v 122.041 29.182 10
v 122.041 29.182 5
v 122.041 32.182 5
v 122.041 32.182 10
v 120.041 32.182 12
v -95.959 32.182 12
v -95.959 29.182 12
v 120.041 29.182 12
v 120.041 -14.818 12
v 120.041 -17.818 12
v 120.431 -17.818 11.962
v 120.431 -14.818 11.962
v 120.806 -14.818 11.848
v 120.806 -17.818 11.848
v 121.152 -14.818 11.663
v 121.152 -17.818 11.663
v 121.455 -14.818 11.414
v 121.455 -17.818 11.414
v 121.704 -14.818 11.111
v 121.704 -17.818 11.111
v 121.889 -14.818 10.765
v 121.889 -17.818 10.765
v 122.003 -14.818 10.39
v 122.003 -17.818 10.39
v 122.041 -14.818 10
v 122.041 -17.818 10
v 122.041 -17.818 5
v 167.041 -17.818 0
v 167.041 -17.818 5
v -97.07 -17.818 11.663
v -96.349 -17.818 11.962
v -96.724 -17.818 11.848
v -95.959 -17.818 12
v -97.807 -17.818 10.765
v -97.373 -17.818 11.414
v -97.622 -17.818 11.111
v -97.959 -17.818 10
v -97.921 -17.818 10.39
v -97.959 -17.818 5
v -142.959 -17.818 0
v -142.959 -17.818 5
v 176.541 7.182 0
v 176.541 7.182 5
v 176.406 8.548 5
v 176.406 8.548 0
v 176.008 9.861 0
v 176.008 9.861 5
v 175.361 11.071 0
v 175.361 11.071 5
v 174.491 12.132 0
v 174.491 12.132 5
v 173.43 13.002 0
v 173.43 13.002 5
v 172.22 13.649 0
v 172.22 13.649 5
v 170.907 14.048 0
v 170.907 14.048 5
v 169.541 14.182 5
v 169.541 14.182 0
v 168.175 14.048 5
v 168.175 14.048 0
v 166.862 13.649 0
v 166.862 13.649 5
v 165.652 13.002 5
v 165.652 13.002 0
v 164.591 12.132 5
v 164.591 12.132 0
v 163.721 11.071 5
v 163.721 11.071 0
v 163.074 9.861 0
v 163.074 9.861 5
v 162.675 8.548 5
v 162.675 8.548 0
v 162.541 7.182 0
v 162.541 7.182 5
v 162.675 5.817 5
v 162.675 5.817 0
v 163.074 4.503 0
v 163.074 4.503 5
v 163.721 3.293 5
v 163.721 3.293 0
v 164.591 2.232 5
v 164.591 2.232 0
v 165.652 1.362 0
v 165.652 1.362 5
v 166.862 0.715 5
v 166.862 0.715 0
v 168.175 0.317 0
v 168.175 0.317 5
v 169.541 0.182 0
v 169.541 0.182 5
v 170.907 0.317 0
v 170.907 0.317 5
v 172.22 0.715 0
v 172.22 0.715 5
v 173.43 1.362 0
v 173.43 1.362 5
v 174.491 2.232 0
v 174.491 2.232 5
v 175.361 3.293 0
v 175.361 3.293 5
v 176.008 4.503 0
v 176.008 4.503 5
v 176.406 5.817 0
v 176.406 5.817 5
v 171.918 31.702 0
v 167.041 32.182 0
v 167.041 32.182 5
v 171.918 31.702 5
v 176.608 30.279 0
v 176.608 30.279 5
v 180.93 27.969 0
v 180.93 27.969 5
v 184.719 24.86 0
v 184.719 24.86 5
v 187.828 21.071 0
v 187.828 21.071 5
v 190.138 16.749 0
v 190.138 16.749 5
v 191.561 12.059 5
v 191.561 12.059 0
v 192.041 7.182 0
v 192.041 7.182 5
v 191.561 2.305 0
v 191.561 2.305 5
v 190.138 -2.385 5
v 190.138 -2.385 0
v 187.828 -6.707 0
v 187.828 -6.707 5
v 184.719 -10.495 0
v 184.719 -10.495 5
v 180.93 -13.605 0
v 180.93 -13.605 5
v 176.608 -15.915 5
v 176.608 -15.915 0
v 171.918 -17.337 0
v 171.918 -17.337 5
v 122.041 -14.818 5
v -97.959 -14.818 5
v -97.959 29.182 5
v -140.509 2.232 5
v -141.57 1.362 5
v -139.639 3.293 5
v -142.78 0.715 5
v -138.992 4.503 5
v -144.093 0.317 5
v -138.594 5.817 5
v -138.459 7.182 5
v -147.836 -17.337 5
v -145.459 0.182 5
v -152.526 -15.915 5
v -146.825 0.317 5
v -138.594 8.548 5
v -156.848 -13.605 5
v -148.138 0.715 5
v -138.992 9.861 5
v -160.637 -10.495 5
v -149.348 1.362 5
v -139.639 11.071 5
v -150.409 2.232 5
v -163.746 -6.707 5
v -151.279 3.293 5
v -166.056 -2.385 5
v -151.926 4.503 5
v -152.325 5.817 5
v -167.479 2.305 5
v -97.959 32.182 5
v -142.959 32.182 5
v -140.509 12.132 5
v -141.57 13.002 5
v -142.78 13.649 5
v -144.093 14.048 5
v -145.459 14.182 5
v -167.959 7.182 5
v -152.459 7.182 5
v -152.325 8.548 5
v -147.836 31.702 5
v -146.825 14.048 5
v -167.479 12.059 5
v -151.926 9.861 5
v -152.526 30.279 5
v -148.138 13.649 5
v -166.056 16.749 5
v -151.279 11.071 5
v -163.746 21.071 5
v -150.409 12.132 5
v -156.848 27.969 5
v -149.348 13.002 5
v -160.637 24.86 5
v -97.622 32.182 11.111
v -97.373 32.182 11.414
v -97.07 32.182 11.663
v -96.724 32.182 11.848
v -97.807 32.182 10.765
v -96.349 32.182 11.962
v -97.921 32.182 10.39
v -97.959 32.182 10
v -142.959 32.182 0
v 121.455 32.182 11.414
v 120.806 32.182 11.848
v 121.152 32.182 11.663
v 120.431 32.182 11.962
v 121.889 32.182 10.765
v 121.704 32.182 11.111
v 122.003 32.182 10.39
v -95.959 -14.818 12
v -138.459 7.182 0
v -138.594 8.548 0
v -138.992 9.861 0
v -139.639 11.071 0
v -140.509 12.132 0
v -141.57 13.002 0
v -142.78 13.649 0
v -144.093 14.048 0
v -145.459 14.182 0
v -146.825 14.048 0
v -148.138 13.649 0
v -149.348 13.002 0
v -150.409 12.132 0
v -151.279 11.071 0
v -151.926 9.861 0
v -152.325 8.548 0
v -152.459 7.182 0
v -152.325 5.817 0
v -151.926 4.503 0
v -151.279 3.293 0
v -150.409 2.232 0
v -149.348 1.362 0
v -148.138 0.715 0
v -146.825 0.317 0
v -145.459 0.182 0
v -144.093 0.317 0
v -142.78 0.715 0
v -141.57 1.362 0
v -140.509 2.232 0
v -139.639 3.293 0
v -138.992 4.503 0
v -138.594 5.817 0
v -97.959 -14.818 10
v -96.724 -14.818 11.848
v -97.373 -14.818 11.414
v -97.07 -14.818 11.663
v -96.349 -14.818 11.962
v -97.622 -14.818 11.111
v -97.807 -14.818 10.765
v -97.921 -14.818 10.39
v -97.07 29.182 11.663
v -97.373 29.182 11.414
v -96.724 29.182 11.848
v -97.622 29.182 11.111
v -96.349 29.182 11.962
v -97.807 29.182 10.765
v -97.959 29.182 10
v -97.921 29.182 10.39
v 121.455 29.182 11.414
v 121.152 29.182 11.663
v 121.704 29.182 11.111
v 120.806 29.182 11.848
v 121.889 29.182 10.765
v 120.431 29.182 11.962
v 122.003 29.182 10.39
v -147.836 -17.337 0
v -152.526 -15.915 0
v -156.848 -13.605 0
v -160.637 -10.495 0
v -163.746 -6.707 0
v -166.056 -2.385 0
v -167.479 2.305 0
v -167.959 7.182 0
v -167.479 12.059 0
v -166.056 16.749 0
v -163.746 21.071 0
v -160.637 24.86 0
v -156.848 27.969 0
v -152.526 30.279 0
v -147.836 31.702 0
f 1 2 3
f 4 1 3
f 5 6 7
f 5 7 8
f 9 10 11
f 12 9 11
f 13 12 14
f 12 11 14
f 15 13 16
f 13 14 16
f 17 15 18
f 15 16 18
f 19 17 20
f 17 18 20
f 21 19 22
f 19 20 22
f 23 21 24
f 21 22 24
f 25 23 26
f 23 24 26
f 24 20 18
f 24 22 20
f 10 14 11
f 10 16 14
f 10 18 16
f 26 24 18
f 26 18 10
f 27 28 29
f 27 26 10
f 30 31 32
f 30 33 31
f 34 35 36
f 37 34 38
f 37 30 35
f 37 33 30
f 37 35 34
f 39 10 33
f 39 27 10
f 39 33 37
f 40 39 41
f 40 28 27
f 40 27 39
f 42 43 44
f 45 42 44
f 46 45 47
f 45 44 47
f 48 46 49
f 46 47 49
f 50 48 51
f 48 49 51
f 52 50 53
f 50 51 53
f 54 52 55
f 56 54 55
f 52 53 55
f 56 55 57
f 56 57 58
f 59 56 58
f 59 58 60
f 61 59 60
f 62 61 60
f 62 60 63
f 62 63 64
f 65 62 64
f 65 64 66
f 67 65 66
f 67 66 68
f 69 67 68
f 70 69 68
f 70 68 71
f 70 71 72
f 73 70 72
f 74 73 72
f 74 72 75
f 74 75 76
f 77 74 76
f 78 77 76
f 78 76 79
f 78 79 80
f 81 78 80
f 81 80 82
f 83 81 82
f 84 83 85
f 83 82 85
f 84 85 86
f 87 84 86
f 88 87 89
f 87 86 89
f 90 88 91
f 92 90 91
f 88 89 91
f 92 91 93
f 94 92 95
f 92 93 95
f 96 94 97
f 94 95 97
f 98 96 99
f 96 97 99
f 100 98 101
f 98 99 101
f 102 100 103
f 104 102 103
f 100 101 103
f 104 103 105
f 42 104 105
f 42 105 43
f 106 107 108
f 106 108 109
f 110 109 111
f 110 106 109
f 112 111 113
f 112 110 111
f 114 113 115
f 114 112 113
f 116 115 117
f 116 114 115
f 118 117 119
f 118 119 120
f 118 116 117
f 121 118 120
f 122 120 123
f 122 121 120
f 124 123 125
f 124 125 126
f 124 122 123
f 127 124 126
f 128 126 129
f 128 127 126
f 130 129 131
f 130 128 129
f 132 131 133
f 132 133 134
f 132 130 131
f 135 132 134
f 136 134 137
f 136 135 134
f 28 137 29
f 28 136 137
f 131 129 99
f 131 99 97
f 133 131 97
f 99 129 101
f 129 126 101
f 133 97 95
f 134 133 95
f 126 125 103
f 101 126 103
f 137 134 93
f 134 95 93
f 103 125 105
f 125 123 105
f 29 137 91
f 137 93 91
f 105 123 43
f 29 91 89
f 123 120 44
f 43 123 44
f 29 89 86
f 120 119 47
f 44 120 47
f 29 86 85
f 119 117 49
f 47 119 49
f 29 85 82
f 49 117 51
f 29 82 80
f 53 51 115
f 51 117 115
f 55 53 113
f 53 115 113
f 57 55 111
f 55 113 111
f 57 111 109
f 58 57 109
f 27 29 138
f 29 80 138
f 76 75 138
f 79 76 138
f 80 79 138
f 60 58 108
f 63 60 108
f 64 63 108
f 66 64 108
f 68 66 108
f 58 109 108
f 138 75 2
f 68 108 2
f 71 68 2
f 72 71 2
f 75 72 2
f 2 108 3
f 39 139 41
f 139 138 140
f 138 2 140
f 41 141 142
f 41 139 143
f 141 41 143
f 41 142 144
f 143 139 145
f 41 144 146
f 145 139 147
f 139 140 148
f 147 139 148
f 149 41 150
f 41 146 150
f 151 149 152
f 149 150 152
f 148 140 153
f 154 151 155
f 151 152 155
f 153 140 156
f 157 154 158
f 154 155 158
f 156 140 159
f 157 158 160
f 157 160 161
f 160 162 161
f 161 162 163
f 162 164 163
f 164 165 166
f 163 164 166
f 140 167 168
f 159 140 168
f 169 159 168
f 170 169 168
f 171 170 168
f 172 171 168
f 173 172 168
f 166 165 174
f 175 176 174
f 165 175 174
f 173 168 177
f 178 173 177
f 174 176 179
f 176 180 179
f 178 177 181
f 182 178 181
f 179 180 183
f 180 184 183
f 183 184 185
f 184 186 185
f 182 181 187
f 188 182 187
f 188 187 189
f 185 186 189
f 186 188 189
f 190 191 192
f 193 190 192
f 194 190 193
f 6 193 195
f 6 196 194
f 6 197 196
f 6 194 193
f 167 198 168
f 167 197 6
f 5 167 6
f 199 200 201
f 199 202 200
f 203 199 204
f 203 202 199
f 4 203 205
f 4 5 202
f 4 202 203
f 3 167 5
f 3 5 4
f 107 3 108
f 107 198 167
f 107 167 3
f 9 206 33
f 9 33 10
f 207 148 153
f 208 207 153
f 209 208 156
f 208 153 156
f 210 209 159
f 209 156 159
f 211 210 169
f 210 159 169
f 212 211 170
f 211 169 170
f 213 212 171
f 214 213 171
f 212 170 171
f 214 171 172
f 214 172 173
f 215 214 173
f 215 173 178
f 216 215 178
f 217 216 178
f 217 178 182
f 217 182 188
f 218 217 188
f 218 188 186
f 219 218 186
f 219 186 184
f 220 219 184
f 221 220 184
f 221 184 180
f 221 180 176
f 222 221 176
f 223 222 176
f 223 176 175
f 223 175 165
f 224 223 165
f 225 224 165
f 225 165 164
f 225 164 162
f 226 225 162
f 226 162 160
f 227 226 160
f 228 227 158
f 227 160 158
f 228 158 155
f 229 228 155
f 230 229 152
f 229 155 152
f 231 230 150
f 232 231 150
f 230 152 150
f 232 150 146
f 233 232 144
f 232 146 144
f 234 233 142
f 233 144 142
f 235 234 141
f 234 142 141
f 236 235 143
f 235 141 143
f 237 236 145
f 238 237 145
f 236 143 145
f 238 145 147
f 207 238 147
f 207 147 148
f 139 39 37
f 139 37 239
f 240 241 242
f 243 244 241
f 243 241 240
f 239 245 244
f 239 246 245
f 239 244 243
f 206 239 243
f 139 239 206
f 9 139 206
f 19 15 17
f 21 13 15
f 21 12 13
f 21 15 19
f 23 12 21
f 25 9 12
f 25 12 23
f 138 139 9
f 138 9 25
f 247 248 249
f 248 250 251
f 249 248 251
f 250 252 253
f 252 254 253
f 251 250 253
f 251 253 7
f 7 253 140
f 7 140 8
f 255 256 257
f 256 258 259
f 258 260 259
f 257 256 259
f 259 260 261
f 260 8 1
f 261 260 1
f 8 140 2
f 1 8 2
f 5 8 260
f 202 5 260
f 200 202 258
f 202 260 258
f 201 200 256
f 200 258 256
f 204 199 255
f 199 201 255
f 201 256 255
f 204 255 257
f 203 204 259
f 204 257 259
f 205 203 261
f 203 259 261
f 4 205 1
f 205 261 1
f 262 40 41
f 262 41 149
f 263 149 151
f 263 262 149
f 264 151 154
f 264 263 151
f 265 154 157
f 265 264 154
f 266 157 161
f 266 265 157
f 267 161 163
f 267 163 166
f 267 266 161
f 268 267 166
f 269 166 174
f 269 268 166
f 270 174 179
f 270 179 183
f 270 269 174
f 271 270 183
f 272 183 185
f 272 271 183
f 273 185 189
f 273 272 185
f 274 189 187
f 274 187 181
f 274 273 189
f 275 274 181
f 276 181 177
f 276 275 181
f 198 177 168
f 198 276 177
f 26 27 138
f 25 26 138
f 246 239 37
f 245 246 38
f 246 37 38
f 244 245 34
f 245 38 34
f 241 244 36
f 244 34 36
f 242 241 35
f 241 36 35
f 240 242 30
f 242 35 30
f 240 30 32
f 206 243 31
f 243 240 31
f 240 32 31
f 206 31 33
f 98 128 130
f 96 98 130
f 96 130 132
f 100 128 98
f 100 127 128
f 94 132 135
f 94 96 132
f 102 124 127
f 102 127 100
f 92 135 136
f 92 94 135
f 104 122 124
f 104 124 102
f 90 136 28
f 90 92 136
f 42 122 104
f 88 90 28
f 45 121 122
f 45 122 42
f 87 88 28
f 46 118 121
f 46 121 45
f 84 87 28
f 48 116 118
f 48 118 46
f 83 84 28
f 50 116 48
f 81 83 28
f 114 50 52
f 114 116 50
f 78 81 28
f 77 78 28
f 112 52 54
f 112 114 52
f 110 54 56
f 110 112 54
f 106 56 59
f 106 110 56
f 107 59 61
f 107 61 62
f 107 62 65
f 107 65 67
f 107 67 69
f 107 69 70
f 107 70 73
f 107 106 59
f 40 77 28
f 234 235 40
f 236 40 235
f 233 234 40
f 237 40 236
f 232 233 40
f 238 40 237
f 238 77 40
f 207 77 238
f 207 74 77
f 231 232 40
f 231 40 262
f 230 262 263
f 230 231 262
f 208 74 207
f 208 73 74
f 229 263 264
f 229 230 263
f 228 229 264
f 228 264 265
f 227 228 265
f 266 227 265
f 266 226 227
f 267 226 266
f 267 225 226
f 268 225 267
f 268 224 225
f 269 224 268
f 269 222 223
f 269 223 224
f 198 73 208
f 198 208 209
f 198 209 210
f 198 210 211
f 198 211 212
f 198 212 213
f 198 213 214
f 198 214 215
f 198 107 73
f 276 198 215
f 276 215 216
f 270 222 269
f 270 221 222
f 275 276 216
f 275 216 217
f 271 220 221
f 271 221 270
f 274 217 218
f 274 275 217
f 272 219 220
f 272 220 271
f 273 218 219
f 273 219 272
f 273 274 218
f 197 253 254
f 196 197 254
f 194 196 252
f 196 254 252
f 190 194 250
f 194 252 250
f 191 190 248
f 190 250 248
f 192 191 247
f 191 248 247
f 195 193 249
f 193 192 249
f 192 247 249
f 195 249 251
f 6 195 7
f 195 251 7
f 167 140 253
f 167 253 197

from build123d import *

# Parameters (mm, degrees)
BOSS_EXTRUDE1_DEPTH = 5
SKETCH3_W           = 220
SKETCH3_H           = 3
BOSS_EXTRUDE2_DEPTH = 7
SKETCH4_R           = 7
CUT_EXTRUDE1_DEPTH  = 7
CUT_EXTRUDE2_DEPTH  = 70


with BuildPart() as part:
    # Sketch2 → Boss-Extrude1 (new body)
    with BuildSketch(Plane.XY):
        with BuildLine():
            Line((-142.959039548, 32.18220339), (167.040960452, 32.18220339))
            ThreePointArc((167.040960452, 32.18220339), (192.040960452, 7.18220339), (167.040960452, -17.81779661))
            Line((167.040960452, -17.81779661), (-142.959039548, -17.81779661))
            ThreePointArc((-142.959039548, -17.81779661), (-167.959039548, 7.18220339), (-142.959039548, 32.18220339))
        make_face()
    extrude(amount=BOSS_EXTRUDE1_DEPTH)

    # Sketch3 → Boss-Extrude2 (add)
    with BuildSketch(Plane.XY.offset(5)):
        with Locations((12.040960452, 30.68220339)):
            Rectangle(SKETCH3_W, SKETCH3_H)
        with Locations((12.040960452, -16.31779661)):
            Rectangle(SKETCH3_W, SKETCH3_H)
    extrude(amount=BOSS_EXTRUDE2_DEPTH)

    # Sketch4 → Cut-Extrude1 (cut)
    with BuildSketch(Plane.XY.offset(5)):
        with Locations((-145.459039548, 7.18220339)):
            Circle(SKETCH4_R)
        with Locations((169.540960452, 7.18220339)):
            Circle(SKETCH4_R)
    extrude(amount=-CUT_EXTRUDE1_DEPTH, mode=Mode.SUBTRACT)

    # Sketch5 → Cut-Extrude2 (cut)
    with BuildSketch(Plane.XZ.offset(17.81779661)):
        with BuildLine():
            ThreePointArc((-97.959039548, 10), (-97.37325311, 11.414213562), (-95.959039548, 12))
            Line((-95.959039548, 12), (-97.959039548, 12))
            Line((-97.959039548, 12), (-97.959039548, 10))
        make_face()
        with BuildLine():
            Line((122.040960452, 12), (120.040960452, 12))
            ThreePointArc((120.040960452, 12), (121.455174014, 11.414213562), (122.040960452, 10))
            Line((122.040960452, 10), (122.040960452, 12))
        make_face()
    extrude(amount=-CUT_EXTRUDE2_DEPTH, mode=Mode.SUBTRACT)


solid = part.part
